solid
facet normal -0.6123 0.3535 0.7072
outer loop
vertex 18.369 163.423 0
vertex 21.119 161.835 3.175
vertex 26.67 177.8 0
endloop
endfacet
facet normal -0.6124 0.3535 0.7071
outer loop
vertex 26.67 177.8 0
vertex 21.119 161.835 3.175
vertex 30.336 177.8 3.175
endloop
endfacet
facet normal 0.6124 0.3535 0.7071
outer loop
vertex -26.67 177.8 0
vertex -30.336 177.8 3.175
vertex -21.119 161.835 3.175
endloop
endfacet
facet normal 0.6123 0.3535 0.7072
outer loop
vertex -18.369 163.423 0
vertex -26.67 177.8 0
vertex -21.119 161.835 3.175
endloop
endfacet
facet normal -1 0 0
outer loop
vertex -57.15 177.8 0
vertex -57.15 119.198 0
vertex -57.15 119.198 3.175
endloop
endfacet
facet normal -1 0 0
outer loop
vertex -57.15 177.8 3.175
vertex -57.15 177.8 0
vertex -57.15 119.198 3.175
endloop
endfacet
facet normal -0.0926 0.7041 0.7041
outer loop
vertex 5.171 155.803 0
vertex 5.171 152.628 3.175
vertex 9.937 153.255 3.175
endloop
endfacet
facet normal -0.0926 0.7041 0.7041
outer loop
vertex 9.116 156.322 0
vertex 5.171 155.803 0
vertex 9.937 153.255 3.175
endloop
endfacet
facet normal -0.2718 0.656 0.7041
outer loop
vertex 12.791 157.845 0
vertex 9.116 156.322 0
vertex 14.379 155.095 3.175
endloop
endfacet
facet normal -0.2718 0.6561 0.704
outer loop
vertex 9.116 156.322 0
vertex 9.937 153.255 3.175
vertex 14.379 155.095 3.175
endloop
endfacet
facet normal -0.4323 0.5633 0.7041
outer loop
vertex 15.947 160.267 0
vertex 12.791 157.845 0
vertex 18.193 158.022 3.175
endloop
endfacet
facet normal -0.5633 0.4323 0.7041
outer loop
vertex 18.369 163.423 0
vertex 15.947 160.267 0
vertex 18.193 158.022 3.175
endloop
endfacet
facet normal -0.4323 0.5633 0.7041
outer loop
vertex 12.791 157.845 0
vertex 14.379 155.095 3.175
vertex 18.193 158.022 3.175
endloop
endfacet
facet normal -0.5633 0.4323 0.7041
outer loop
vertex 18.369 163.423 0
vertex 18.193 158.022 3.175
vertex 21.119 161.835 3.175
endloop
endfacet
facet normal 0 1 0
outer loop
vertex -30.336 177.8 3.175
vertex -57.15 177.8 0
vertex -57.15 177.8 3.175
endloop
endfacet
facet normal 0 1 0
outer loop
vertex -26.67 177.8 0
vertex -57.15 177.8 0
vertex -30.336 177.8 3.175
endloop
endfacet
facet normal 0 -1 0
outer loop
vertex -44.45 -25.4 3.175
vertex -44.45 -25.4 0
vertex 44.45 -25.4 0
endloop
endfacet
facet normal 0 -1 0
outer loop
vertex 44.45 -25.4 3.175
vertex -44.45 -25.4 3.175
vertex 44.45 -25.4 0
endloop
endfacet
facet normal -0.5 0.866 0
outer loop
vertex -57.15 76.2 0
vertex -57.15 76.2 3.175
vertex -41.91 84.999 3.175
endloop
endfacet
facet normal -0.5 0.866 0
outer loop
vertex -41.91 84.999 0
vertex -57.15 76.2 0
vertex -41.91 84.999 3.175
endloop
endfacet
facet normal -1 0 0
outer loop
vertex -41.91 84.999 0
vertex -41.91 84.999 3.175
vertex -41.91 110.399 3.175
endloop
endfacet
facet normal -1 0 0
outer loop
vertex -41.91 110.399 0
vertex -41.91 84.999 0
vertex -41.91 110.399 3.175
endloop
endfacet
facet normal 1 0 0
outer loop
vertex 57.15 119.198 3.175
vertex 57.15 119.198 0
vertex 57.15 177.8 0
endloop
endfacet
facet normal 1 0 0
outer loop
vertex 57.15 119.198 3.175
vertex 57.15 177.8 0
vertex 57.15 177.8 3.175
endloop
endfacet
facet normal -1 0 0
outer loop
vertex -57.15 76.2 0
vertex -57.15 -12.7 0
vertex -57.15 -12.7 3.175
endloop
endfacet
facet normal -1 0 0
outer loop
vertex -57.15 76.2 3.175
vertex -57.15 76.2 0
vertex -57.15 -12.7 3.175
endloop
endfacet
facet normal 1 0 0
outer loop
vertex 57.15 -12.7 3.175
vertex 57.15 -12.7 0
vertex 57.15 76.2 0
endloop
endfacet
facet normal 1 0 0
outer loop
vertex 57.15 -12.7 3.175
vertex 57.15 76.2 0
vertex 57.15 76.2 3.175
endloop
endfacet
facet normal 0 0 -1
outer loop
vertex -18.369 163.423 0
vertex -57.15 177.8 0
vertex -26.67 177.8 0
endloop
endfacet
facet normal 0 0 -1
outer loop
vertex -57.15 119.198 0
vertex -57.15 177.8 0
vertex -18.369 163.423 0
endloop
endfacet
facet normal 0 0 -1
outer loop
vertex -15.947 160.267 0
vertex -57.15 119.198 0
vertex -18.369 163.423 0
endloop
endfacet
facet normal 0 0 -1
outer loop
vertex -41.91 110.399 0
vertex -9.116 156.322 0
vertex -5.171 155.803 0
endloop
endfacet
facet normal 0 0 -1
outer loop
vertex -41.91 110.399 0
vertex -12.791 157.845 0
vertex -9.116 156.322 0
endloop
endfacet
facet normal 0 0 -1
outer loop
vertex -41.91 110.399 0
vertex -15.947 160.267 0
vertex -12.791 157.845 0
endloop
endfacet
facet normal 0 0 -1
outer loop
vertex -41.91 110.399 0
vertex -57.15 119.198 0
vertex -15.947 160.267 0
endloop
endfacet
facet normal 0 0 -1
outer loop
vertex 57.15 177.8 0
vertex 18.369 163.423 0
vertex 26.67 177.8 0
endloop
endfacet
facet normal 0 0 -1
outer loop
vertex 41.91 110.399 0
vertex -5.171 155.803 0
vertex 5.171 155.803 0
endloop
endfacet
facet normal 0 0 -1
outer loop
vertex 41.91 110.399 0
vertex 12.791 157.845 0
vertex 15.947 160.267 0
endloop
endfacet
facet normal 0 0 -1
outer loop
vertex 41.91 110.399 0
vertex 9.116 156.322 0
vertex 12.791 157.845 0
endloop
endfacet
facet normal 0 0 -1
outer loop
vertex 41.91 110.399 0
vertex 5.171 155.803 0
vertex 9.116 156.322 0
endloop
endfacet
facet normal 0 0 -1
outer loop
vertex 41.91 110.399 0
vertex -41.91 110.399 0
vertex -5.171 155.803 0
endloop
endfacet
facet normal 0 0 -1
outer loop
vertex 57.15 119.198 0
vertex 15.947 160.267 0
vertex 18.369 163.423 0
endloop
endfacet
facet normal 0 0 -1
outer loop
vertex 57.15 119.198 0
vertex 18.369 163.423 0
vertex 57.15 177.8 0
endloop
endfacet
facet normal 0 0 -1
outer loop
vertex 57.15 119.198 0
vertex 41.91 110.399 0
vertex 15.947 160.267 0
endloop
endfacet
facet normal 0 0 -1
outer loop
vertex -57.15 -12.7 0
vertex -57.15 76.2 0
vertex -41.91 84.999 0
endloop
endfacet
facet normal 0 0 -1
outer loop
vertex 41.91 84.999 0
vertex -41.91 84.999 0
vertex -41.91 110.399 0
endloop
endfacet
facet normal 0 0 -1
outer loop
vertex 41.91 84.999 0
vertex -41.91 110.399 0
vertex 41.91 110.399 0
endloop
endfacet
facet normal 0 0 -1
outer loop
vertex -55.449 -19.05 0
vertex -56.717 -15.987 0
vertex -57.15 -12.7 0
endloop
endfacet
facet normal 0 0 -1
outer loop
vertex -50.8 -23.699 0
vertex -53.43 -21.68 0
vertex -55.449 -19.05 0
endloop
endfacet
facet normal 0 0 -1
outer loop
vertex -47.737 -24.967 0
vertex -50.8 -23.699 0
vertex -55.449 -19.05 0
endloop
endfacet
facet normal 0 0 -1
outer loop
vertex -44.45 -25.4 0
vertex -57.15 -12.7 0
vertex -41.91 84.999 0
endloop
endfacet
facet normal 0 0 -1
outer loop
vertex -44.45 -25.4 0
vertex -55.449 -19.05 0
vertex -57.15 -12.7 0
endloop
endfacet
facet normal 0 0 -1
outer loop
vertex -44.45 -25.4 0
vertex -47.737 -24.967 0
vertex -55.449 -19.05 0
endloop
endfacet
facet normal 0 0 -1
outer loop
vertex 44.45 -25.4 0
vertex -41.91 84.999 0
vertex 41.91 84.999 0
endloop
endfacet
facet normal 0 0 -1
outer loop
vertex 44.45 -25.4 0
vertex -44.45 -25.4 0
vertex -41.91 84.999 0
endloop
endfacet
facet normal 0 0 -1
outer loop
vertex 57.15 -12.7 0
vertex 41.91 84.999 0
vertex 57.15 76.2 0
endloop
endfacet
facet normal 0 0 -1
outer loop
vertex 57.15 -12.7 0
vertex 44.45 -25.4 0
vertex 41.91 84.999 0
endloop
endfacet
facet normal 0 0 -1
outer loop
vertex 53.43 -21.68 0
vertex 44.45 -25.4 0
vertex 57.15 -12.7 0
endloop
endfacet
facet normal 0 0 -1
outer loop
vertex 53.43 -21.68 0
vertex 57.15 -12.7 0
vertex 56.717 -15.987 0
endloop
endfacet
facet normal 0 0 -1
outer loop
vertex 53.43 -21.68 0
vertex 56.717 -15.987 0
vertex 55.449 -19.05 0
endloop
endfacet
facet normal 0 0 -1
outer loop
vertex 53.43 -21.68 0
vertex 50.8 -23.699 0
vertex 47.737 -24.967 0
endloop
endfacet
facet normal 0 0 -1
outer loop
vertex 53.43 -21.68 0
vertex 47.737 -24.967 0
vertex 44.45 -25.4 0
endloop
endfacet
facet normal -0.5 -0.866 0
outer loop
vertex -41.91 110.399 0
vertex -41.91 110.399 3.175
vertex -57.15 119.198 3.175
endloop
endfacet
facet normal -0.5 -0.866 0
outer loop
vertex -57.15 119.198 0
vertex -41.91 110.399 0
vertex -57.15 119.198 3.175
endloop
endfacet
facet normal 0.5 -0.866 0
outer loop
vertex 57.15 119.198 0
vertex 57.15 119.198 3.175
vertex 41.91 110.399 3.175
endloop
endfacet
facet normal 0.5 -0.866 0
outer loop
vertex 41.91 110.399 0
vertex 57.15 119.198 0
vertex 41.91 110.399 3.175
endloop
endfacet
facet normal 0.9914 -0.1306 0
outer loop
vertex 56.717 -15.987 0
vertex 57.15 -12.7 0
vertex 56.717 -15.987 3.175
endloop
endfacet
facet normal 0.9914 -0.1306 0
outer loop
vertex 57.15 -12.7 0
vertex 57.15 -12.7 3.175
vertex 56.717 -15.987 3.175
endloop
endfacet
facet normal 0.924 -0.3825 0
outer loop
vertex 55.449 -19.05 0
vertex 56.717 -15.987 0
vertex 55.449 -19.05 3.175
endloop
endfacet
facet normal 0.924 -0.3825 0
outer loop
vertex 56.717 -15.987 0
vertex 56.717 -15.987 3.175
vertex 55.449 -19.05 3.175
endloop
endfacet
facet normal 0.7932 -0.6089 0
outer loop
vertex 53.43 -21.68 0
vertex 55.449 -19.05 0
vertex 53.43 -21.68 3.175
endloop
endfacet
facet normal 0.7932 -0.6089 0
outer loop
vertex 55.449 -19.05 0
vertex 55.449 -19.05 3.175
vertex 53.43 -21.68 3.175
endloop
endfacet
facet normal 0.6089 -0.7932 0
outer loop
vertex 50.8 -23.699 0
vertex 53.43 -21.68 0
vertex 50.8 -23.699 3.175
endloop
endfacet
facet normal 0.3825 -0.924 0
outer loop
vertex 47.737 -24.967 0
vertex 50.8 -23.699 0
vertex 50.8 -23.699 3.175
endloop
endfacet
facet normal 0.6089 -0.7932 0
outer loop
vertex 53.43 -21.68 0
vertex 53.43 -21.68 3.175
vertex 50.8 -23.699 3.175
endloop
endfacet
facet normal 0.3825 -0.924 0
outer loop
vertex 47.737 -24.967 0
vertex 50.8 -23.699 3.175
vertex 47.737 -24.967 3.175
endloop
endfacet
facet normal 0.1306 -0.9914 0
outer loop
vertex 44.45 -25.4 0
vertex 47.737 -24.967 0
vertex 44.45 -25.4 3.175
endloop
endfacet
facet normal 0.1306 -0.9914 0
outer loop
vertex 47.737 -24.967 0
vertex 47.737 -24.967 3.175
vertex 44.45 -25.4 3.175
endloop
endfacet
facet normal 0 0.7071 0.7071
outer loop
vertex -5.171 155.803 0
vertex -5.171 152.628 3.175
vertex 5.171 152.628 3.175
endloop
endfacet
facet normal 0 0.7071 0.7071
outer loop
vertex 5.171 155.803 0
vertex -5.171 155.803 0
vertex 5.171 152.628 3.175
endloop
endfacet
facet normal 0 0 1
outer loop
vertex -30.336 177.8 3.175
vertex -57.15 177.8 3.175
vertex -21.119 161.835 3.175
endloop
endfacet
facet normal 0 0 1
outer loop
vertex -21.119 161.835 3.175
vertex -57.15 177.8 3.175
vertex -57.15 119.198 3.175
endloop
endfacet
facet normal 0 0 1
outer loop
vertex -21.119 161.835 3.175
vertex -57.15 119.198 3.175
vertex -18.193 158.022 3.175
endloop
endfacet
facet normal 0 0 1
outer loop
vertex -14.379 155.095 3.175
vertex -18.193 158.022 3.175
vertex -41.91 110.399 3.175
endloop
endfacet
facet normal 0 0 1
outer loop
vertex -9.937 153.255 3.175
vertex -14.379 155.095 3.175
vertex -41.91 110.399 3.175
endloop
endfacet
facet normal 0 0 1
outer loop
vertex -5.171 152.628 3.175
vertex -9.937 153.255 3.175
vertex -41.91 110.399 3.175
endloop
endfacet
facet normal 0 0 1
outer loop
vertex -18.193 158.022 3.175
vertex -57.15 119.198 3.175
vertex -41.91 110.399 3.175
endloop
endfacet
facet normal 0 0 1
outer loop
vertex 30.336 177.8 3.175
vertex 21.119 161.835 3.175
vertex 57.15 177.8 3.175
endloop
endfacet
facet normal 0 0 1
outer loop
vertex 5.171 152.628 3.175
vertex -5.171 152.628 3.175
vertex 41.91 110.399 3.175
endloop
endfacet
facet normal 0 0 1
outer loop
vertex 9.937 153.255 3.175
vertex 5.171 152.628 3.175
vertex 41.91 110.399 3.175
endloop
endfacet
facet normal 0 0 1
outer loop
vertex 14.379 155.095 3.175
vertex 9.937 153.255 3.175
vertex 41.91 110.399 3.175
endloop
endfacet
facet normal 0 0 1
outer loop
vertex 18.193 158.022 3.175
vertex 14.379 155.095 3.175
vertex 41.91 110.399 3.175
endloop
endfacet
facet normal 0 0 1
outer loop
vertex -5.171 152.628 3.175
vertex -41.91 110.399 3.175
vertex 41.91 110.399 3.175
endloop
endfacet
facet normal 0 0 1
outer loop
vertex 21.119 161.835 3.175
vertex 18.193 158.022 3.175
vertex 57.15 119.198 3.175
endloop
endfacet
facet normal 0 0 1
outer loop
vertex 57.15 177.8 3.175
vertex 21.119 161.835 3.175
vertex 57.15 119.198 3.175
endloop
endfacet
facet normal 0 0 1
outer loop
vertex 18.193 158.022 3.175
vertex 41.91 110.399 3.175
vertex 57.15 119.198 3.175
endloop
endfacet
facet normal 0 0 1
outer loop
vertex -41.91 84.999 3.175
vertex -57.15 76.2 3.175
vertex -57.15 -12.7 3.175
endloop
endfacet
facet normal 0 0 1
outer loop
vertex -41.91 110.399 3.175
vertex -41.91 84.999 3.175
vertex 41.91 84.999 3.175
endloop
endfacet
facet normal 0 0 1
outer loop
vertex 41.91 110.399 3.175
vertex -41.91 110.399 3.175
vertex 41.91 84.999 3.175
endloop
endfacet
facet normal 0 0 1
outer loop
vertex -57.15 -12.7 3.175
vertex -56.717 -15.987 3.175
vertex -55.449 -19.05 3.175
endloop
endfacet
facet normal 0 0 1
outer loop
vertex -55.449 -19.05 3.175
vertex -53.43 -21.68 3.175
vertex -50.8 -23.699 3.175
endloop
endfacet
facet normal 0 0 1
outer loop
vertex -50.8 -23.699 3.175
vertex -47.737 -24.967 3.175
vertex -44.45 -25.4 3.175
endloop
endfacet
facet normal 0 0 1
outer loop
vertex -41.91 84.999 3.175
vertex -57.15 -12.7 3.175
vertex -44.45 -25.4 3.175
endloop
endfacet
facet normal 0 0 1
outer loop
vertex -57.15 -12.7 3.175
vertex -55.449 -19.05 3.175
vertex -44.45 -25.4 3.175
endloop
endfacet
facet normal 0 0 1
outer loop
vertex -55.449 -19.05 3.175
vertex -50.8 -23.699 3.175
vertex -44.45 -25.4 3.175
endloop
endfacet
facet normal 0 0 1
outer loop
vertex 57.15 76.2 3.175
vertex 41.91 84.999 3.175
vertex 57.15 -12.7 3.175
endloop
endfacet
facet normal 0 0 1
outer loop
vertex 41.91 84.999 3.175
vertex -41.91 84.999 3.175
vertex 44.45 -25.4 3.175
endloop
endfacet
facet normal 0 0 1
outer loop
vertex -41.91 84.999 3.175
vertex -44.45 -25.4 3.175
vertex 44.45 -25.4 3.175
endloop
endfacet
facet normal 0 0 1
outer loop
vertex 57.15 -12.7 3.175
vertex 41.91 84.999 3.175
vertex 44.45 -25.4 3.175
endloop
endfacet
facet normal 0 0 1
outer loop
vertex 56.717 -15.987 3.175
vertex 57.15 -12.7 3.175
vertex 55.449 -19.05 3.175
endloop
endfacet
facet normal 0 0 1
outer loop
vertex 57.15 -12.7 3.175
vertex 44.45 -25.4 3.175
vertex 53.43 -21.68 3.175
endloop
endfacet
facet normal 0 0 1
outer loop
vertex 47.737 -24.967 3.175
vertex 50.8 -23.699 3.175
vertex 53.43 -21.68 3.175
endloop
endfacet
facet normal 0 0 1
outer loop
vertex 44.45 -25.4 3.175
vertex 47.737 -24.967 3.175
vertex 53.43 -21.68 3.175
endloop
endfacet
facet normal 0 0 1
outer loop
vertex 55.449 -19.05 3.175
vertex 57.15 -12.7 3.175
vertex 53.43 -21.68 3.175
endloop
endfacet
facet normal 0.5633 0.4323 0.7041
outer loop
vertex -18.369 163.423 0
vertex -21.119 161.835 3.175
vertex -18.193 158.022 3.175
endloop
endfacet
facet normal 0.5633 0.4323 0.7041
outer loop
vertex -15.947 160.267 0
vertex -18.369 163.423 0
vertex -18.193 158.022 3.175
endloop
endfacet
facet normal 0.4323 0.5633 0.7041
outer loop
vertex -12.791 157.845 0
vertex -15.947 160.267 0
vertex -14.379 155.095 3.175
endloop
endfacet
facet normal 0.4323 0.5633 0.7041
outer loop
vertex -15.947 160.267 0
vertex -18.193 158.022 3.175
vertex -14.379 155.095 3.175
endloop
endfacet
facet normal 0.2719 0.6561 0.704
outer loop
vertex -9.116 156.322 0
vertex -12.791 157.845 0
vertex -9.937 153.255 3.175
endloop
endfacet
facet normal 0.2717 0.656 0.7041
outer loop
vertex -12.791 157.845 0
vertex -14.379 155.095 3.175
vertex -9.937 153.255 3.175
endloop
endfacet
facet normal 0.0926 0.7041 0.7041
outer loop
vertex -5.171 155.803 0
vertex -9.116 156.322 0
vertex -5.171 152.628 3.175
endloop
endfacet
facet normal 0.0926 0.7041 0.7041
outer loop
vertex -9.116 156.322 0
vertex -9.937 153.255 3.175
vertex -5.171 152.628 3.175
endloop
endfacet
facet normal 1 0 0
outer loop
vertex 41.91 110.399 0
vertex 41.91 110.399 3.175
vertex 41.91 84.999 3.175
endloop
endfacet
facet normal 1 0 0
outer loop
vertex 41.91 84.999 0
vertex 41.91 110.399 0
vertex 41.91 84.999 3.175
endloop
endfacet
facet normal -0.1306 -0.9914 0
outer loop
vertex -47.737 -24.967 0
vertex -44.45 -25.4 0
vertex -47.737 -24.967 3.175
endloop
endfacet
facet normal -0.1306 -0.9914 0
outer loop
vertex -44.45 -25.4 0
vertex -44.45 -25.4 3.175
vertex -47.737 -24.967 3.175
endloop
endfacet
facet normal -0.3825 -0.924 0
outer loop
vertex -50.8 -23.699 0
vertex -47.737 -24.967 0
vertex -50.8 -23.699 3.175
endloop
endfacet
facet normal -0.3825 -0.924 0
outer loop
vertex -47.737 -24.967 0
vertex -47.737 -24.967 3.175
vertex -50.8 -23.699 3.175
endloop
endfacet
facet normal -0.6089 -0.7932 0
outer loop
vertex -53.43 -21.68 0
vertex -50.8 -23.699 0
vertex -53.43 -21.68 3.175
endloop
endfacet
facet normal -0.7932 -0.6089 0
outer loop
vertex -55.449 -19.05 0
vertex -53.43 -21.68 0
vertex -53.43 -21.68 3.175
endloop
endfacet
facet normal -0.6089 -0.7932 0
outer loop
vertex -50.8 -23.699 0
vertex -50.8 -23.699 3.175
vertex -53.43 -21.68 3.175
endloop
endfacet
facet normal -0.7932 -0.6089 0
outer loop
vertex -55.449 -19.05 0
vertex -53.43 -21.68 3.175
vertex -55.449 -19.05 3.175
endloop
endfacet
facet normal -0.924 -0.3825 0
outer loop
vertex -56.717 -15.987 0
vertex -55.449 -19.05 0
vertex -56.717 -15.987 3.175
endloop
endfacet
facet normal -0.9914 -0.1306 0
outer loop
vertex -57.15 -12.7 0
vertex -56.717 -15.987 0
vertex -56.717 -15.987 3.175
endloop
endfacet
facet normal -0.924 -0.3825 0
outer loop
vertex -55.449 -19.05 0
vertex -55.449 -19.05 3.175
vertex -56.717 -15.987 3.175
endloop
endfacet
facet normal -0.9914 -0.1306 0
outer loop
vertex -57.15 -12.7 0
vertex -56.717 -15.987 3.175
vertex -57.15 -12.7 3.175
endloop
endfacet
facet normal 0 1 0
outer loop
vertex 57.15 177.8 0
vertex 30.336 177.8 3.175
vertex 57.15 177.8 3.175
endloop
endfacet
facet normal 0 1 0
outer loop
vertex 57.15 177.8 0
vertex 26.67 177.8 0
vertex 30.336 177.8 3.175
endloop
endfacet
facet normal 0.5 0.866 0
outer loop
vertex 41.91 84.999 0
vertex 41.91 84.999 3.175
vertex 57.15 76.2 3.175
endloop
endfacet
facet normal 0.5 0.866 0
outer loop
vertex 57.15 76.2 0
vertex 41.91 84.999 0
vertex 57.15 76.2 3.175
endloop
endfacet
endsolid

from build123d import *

# Parameters (mm, degrees)
F0_W     = 114.3
F0_H     = 50.8
F1_DEPTH = 3.175
F2_DEPTH = 152.4
F4_DEPTH = 3.302
F5_R     = 15.24
F6_R     = 12.7
F7_DEPTH = 3.175
F8_SIZE  = 3.17499


# Not quite as in the source:
# - a fillet or chamfer is up to 0.001 mm smaller than in the source, because OpenCascade refuses the exact size


with BuildPart() as f1:
    # F0 (on Top) → F1 (new body)
    with BuildSketch(Plane.XY):
        Rectangle(F0_W, F0_H)
    extrude(amount=F1_DEPTH)

    # F2 (add): a face of the model
    f2_faces = [f1.faces().sort_by_distance(p)[0] for p in [
        (0, 25.4, 1.5875),
    ]]
    extrude(f2_faces, amount=F2_DEPTH)

    # F3 (on face) → F4 (cut)
    with BuildSketch(Plane.XY.offset(3.175)):
        Polygon((-13.97, 155.8029547439), (13.97, 155.8029547439), (26.67, 177.8), (-26.67, 177.8), align=None)
    extrude(amount=-F4_DEPTH, mode=Mode.SUBTRACT)

    # F5
    f5_edges = [f1.edges().sort_by_distance(p)[0] for p in [
        (13.97, 155.802955, 1.5875),
        (-13.97, 155.802955, 1.5875),
    ]]
    fillet(f5_edges, radius=F5_R)

    # F6
    f6_edges = [f1.edges().sort_by_distance(p)[0] for p in [
        (57.15, -25.4, 1.5875),
        (-57.15, -25.4, 1.5875),
    ]]
    fillet(f6_edges, radius=F6_R)

    # F3 (on face) → F7 (cut)
    with BuildSketch(Plane.XY.offset(3.175)):
        Polygon((57.15, 76.2), (57.15, 119.1976362049), (41.91, 110.3988181024), (41.91, 84.9988181024), align=None)
        Polygon((-41.91, 110.3988181024), (-57.15, 119.1976362049), (-57.15, 76.2), (-41.91, 84.9988181024), align=None)
    extrude(amount=-F7_DEPTH, mode=Mode.SUBTRACT)

    # F8 (size 3.175 in the source; OpenCascade refuses exactly that, so slightly less here)
    f8_edges = [f1.edges().sort_by_distance(p)[0] for p in [
        (-22.519705, 170.611477, 3.175),
        (-12.791182, 157.844728, 3.175),
        (0, 155.802955, 3.175),
        (12.791182, 157.844728, 3.175),
        (22.519705, 170.611477, 3.175),
    ]]
    chamfer(f8_edges, length=F8_SIZE)


solid = f1.part
